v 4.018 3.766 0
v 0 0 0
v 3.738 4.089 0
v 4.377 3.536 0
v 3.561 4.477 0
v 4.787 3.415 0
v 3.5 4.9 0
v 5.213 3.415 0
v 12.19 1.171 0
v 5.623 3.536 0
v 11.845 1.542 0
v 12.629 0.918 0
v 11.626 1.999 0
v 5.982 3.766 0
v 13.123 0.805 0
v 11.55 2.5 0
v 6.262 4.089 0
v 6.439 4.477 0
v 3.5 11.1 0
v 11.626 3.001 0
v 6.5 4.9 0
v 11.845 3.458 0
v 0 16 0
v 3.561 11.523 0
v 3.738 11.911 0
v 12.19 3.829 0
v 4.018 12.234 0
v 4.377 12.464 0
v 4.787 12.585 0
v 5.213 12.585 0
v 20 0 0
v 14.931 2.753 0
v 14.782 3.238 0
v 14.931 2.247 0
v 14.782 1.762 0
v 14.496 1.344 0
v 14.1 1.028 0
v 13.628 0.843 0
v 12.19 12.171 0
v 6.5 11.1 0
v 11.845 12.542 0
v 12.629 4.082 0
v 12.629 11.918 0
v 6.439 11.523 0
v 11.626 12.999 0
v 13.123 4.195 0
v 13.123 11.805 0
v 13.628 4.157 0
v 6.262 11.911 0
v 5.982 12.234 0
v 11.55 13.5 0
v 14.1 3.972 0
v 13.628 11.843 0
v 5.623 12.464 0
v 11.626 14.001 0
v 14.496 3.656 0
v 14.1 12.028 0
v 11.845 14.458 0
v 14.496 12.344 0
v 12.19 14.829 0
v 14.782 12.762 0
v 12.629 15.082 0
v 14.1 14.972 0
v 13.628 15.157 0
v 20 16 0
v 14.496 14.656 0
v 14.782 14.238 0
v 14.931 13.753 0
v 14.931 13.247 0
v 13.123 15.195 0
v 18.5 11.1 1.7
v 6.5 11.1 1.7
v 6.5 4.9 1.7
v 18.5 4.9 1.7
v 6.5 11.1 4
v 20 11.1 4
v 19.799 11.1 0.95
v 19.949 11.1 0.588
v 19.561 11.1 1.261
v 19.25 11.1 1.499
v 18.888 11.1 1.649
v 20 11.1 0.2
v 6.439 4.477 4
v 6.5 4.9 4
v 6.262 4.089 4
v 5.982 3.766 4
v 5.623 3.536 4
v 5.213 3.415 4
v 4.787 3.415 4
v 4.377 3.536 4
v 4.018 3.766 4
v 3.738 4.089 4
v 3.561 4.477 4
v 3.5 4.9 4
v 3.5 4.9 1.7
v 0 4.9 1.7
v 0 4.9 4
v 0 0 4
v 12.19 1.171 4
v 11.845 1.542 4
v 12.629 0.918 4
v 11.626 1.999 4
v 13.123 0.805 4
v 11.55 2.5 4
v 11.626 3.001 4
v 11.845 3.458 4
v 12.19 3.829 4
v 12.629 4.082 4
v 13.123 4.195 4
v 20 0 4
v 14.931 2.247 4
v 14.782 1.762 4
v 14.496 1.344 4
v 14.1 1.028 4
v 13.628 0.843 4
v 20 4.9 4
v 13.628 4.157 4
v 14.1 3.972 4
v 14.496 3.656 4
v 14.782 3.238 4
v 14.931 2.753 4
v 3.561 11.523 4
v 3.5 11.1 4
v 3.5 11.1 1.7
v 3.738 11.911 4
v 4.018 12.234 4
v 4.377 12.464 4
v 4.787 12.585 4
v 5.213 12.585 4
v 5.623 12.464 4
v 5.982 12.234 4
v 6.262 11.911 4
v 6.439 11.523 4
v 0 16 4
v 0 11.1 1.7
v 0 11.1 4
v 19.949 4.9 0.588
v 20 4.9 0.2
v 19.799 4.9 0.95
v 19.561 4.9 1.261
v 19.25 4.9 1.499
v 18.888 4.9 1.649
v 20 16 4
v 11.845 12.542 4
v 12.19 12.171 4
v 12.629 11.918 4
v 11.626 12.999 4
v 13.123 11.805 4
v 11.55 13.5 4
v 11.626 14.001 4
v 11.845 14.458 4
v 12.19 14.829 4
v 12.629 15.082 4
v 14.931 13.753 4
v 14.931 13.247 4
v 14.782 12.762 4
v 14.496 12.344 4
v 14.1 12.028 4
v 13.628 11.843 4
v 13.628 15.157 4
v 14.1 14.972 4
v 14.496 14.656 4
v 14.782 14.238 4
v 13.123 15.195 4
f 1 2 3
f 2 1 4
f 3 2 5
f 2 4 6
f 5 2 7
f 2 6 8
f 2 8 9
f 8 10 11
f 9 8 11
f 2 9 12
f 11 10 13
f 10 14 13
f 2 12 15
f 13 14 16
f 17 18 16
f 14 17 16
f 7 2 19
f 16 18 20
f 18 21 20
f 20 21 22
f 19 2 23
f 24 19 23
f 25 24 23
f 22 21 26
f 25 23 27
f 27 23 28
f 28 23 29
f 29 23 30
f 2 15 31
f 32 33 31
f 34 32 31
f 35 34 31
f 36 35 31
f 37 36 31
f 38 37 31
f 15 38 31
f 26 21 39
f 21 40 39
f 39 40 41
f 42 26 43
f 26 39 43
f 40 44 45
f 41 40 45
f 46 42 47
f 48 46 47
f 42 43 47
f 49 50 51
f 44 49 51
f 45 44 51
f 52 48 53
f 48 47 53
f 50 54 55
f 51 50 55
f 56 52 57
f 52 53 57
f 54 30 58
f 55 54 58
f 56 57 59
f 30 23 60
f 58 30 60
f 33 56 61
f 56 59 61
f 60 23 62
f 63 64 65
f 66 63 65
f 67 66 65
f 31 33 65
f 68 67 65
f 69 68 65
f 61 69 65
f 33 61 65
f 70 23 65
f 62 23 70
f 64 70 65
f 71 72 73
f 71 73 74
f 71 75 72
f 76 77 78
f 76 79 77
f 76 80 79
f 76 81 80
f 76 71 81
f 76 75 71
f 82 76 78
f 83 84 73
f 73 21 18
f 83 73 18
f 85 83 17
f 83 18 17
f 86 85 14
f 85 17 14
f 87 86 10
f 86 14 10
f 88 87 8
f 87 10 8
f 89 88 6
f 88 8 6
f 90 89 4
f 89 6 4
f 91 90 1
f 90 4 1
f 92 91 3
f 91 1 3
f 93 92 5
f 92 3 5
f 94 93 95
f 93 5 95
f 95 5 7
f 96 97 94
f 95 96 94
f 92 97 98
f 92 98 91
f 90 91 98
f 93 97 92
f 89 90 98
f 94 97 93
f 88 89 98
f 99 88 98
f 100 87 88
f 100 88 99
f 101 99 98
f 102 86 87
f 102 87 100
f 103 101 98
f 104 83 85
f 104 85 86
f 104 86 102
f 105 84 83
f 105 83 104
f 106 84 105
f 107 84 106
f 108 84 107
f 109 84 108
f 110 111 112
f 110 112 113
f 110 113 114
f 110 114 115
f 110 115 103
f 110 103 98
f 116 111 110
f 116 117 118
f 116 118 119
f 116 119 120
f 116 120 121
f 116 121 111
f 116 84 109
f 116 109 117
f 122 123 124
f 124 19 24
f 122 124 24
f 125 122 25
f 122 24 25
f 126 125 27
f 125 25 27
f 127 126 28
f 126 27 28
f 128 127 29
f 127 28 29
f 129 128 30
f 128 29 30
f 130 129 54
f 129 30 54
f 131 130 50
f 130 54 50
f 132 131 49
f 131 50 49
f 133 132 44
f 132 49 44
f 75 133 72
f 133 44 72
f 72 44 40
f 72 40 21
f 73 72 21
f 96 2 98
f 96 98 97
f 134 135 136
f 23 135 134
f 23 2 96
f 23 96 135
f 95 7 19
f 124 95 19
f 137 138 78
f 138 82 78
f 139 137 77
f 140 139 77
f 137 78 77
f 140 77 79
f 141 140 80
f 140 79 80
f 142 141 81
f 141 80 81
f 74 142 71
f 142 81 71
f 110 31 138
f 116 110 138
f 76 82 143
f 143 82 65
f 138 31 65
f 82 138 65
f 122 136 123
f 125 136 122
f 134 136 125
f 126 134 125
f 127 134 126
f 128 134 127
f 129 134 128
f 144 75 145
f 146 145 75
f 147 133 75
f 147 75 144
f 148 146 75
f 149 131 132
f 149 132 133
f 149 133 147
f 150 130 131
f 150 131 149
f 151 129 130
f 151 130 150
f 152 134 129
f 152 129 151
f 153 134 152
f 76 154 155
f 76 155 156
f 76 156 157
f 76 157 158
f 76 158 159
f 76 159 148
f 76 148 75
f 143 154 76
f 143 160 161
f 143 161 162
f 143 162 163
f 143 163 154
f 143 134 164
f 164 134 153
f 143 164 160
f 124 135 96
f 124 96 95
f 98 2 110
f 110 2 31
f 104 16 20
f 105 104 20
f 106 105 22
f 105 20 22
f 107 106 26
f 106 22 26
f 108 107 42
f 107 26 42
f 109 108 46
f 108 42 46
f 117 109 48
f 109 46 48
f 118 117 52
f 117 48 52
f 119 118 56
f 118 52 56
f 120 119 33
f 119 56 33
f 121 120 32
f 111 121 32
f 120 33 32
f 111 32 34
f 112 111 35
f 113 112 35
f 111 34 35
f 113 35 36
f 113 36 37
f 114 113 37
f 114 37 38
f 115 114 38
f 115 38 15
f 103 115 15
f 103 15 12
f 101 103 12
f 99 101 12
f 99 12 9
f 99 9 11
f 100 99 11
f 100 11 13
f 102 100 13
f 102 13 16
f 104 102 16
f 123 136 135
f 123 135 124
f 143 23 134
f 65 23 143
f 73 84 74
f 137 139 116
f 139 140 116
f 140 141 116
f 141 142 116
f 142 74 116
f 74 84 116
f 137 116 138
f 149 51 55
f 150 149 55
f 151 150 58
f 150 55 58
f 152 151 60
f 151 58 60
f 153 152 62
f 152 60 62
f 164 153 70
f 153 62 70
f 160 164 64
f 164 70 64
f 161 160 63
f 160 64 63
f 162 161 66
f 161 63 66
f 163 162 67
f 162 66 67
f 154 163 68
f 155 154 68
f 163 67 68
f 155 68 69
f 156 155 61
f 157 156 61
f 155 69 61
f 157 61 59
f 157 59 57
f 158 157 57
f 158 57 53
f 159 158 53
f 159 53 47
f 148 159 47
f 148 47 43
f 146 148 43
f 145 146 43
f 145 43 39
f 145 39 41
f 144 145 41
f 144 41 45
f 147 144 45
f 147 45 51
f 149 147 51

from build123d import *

# Parameters (mm, degrees)
SKETCH1_W            = 20
SKETCH1_H            = 16
BOSS_EXTRUDE1_DEPTH  = 4
M3_CLEARANCE_HOLE1_D = 3.4
SKETCH4_W            = 27.686396546
SKETCH4_H            = 6.2
CUT_EXTRUDE1_DEPTH   = 2.3
FILLET1_R            = 1.5


with BuildPart() as part:
    # Sketch1 → Boss-Extrude1 (new body)
    with BuildSketch(Plane.XY):
        with Locations((10, 8)):
            Rectangle(SKETCH1_W, SKETCH1_H)
        with BuildLine():
            Line((6.5, 11.1), (6.5, 4.9))
            ThreePointArc((6.5, 4.9), (5, 3.4), (3.5, 4.9))
            Line((3.5, 4.9), (3.5, 11.1))
            ThreePointArc((3.5, 11.1), (5, 12.6), (6.5, 11.1))
        make_face(mode=Mode.SUBTRACT)
    extrude(amount=BOSS_EXTRUDE1_DEPTH)

    # M3 Clearance Hole1 (through all)
    with Locations(Plane.XY.offset(4)):
        with Locations((13.25, 13.5), (13.25, 2.5)):
            Hole(M3_CLEARANCE_HOLE1_D / 2)

    # Sketch4 → Cut-Extrude1 (cut)
    with BuildSketch(Plane.XY.offset(4)):
        with Locations((12.569554471, 8)):
            Rectangle(SKETCH4_W, SKETCH4_H)
    extrude(amount=-CUT_EXTRUDE1_DEPTH, mode=Mode.SUBTRACT)

    # Fillet1
    fillet1_edges = [part.edges().sort_by_distance(p)[0] for p in [
        (20, 8, 1.7),
    ]]
    fillet(fillet1_edges, radius=FILLET1_R)


solid = part.part
